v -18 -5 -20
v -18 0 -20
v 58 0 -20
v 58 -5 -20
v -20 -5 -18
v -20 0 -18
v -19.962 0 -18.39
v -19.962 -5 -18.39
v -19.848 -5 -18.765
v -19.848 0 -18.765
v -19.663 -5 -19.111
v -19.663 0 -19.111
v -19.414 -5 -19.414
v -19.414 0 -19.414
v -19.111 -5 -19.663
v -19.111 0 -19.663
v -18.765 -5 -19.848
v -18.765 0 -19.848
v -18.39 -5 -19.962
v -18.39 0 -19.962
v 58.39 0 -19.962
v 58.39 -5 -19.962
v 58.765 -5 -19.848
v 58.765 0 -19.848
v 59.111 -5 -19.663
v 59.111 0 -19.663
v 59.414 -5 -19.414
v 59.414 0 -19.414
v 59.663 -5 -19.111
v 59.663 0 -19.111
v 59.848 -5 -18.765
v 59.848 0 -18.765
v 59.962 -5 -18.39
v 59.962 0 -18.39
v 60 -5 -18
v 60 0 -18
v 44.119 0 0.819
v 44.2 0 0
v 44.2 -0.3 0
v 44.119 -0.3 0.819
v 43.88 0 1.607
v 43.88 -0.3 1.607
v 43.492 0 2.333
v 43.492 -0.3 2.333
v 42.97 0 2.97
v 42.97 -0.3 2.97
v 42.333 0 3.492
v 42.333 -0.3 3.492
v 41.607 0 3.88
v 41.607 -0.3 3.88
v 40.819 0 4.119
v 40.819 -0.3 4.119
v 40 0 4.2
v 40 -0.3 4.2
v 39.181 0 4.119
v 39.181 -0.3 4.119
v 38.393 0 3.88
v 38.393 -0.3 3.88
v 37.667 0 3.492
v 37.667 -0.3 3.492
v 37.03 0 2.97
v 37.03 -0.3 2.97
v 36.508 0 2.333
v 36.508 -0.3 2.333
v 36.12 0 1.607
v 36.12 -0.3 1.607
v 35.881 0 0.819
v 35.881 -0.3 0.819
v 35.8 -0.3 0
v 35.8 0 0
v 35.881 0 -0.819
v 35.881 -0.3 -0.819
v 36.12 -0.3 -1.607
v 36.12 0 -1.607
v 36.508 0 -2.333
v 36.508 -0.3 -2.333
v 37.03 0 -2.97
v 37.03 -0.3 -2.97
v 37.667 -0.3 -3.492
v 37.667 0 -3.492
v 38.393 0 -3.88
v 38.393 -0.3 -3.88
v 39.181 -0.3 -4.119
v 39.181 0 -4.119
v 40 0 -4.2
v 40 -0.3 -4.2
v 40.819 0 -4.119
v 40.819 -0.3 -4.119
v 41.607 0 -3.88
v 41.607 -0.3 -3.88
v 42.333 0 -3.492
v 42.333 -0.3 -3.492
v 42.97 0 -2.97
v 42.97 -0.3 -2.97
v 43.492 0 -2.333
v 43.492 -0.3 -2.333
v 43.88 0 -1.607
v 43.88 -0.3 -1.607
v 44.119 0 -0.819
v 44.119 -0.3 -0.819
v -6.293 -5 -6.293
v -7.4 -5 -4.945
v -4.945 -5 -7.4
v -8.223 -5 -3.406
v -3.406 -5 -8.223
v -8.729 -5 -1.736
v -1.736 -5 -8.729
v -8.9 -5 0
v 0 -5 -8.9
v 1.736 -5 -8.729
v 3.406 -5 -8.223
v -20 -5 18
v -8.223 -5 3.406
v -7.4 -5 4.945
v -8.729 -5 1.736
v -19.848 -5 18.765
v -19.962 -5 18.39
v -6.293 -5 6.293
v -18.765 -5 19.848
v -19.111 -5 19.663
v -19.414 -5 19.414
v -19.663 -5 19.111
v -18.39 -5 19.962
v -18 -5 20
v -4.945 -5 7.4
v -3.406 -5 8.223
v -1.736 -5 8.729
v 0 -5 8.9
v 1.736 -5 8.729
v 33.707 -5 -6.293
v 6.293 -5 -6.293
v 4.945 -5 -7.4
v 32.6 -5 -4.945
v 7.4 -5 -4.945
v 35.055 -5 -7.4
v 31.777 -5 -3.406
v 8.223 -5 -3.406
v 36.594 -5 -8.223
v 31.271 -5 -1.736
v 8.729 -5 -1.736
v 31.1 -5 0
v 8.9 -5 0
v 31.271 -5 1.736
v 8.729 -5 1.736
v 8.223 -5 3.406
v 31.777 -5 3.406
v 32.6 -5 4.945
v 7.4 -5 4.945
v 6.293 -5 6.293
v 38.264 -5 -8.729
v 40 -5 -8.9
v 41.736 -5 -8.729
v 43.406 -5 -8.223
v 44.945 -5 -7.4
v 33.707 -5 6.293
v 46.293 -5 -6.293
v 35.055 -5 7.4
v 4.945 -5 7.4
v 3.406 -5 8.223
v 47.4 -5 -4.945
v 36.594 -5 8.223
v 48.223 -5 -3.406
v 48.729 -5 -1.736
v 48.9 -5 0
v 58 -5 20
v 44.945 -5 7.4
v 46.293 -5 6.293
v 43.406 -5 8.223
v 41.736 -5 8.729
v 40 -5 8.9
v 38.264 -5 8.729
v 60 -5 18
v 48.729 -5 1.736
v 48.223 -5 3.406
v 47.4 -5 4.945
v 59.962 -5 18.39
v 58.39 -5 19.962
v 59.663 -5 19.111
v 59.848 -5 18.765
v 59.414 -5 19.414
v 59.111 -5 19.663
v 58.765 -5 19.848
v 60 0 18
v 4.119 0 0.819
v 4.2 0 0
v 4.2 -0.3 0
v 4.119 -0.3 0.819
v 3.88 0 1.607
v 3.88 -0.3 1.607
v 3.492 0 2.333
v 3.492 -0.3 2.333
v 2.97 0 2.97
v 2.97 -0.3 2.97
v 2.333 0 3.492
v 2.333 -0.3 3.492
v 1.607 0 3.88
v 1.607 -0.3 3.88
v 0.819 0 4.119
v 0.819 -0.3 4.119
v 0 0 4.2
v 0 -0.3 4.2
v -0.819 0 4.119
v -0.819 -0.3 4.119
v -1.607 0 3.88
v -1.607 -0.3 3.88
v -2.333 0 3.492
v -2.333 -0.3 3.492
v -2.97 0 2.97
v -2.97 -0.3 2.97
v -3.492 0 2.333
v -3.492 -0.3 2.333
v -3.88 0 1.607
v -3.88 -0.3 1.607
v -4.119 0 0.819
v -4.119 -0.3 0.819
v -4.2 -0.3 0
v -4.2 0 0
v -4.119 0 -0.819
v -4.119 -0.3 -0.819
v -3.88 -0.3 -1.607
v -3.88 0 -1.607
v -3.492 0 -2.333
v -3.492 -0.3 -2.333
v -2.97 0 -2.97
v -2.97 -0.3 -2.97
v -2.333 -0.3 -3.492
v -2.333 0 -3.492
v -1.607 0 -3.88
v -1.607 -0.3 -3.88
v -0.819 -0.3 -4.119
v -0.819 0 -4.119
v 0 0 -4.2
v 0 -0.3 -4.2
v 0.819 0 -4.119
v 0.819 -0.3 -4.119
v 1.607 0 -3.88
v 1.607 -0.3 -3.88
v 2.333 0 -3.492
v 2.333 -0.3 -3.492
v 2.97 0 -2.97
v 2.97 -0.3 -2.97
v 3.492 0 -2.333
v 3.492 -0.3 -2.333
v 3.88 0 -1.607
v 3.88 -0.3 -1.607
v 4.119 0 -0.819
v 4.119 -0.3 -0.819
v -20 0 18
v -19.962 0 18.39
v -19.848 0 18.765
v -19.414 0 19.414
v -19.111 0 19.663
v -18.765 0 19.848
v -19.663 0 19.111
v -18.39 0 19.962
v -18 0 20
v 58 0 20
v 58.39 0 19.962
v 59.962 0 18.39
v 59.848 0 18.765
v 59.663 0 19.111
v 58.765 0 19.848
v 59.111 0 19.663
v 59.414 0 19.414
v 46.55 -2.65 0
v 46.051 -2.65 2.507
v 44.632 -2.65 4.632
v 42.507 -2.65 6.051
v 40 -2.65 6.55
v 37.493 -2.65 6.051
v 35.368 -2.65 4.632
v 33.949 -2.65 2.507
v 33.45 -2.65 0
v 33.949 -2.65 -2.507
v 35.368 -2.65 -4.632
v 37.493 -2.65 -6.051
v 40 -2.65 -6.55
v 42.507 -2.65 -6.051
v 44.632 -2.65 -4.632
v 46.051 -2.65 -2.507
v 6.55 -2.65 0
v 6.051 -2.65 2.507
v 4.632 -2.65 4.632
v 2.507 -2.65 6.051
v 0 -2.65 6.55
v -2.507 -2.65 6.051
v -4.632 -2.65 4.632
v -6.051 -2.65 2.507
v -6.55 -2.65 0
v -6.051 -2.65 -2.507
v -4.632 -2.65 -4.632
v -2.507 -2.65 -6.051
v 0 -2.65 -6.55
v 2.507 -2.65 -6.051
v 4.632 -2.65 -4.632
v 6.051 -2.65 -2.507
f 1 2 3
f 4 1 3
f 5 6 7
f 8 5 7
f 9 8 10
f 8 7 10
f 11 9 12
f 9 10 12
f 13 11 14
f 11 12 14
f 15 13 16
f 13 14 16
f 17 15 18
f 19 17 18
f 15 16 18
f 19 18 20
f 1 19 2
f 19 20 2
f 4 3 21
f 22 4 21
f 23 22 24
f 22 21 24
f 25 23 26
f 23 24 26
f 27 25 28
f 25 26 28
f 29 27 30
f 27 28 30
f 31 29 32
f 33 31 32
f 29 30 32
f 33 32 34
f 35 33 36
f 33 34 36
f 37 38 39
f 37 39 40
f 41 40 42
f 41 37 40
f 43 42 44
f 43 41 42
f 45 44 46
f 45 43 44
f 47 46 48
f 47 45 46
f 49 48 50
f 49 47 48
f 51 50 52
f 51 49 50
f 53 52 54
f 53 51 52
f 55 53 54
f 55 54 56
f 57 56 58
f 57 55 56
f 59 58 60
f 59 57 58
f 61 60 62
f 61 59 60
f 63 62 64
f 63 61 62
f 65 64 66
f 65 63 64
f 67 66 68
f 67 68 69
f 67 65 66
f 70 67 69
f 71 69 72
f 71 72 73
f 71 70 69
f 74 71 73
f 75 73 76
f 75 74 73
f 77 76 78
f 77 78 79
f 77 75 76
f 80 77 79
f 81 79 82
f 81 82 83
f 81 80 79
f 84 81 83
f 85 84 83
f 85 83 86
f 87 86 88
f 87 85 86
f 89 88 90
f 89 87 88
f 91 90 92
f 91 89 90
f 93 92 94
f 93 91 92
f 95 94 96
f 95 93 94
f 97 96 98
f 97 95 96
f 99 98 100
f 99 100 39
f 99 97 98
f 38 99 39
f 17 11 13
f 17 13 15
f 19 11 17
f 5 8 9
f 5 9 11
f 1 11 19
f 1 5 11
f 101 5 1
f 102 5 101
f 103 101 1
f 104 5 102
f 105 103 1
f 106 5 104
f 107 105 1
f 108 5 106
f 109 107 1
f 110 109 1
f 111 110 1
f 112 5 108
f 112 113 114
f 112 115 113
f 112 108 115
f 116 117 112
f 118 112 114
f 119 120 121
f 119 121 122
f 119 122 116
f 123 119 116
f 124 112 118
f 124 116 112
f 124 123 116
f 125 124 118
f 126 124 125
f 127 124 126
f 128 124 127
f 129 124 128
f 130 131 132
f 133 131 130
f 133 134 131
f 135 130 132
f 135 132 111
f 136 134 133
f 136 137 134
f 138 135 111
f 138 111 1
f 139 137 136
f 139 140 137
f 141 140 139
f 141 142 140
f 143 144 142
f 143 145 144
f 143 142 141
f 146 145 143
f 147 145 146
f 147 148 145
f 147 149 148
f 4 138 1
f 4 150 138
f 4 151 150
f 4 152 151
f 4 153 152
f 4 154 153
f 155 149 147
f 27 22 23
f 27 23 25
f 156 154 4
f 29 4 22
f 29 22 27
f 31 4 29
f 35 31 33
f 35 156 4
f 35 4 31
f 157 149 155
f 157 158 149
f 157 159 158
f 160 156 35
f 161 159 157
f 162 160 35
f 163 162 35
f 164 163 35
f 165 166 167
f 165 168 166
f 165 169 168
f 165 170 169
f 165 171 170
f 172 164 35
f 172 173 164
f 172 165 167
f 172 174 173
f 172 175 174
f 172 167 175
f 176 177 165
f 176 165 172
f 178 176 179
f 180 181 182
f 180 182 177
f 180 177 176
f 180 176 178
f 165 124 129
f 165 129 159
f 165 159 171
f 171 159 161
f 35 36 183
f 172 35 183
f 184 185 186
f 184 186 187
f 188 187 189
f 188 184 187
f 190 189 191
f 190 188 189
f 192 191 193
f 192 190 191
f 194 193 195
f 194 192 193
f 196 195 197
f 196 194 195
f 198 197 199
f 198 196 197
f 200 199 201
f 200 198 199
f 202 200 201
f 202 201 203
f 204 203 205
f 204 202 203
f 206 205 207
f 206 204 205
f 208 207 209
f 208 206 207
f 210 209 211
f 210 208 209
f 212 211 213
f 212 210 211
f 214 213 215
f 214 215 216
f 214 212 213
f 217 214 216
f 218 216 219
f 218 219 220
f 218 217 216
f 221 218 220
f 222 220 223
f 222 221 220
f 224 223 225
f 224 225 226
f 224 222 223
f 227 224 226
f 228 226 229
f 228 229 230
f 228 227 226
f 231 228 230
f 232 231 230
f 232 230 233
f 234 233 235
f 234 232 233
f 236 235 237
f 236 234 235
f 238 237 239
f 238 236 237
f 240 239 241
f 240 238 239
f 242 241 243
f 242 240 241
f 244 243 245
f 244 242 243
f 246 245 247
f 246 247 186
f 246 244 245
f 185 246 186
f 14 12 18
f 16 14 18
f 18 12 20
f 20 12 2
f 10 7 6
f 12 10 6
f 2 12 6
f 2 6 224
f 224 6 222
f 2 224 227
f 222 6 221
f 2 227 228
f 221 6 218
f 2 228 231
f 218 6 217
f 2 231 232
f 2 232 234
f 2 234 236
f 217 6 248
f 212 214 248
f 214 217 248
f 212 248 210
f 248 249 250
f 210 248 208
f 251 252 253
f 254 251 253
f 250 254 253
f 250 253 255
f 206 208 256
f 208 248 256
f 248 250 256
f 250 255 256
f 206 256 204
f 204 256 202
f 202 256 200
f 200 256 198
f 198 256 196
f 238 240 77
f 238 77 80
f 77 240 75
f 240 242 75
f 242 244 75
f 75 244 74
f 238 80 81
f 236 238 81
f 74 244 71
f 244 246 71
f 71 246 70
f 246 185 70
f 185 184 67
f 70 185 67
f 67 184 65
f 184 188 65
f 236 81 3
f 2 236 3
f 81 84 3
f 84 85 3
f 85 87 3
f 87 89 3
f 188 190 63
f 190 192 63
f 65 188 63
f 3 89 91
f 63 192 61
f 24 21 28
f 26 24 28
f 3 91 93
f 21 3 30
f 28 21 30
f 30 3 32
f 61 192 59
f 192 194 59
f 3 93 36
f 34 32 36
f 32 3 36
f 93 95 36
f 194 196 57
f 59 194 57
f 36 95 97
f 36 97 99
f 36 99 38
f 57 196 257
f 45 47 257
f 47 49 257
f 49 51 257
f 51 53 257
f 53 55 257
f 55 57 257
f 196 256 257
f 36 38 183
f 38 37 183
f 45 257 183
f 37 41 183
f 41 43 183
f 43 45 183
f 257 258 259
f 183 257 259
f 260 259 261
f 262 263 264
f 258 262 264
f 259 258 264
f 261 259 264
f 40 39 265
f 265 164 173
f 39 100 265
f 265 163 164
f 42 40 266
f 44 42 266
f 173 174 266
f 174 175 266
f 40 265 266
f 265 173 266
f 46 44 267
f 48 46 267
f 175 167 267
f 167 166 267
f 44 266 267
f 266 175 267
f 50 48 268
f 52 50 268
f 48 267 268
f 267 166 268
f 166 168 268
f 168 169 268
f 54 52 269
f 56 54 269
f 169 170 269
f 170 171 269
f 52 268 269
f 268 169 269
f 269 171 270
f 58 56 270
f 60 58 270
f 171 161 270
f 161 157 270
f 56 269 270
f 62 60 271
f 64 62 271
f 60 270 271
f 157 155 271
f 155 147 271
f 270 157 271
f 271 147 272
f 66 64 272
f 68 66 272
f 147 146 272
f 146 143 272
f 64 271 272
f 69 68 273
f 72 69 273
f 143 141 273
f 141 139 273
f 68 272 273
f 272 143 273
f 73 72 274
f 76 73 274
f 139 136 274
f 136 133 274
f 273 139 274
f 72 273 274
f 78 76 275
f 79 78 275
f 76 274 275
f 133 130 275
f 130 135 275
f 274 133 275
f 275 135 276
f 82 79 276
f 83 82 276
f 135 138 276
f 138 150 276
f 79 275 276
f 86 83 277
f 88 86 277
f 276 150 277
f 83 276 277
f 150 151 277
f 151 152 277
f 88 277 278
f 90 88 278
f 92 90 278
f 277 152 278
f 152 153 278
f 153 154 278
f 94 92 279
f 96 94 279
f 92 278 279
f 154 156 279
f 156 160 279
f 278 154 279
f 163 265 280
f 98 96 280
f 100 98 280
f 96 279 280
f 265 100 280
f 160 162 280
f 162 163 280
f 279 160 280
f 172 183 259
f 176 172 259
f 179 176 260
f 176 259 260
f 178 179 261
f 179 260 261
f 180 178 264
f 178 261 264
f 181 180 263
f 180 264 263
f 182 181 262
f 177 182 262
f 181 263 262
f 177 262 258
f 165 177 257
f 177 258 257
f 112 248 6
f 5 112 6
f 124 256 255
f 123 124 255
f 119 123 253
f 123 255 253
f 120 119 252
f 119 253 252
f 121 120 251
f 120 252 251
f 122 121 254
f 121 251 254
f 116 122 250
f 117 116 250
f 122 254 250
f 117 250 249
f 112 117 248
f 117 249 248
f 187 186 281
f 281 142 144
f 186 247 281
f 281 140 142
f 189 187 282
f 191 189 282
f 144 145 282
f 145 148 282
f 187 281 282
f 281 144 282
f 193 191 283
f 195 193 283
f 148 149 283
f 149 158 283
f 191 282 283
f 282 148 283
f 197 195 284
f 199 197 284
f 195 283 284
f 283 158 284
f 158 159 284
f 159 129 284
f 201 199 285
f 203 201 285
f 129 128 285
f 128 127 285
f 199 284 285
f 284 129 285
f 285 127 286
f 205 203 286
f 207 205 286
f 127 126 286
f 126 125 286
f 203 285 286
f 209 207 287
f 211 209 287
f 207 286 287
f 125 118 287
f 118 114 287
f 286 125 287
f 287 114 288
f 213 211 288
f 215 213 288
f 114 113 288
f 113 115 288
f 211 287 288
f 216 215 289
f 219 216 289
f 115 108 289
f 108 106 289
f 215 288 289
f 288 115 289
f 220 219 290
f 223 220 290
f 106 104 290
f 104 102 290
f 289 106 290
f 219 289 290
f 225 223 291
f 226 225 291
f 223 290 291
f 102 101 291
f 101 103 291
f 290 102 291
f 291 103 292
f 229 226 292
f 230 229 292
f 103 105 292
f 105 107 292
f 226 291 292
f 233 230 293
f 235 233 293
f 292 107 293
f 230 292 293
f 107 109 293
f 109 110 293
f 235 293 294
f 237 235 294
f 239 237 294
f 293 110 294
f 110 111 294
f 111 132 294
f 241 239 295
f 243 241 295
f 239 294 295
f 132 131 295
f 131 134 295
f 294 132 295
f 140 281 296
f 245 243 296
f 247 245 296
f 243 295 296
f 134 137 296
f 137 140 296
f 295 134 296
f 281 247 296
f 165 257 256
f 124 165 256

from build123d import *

# Parameters (mm, degrees)
F0_R     = 4.2
F1_DEPTH = 5
F2_SIZE  = 4.7


# Not quite as in the source:
# - a feature names something its author has since deleted; it is built from what else it names


with BuildPart() as f1:
    # F0 (on Front) → F1 (new body)
    with BuildSketch(Plane.XZ):
        with BuildLine():
            Line((58, 20), (-18, 20))
            ThreePointArc((-18, 20), (-19.4142135624, 19.4142135624), (-20, 18))
            Line((-20, 18), (-20, -18))
            ThreePointArc((-20, -18), (-19.4142135624, -19.4142135624), (-18, -20))
            Line((-18, -20), (58, -20))
            ThreePointArc((58, -20), (59.4142135624, -19.4142135624), (60, -18))
            Line((60, -18), (60, 18))
            ThreePointArc((60, 18), (59.4142135624, 19.4142135624), (58, 20))
        make_face()
        Circle(F0_R, mode=Mode.SUBTRACT)
        with Locations((40, 0)):
            Circle(F0_R, mode=Mode.SUBTRACT)
    extrude(amount=F1_DEPTH)

    # F2
    f2_edges = [f1.edges().sort_by_distance(p)[0] for p in [
        (-4.2, -5, 0),
        (35.8, -5, 0),
    ]]
    chamfer(f2_edges, length=F2_SIZE)


solid = f1.part
